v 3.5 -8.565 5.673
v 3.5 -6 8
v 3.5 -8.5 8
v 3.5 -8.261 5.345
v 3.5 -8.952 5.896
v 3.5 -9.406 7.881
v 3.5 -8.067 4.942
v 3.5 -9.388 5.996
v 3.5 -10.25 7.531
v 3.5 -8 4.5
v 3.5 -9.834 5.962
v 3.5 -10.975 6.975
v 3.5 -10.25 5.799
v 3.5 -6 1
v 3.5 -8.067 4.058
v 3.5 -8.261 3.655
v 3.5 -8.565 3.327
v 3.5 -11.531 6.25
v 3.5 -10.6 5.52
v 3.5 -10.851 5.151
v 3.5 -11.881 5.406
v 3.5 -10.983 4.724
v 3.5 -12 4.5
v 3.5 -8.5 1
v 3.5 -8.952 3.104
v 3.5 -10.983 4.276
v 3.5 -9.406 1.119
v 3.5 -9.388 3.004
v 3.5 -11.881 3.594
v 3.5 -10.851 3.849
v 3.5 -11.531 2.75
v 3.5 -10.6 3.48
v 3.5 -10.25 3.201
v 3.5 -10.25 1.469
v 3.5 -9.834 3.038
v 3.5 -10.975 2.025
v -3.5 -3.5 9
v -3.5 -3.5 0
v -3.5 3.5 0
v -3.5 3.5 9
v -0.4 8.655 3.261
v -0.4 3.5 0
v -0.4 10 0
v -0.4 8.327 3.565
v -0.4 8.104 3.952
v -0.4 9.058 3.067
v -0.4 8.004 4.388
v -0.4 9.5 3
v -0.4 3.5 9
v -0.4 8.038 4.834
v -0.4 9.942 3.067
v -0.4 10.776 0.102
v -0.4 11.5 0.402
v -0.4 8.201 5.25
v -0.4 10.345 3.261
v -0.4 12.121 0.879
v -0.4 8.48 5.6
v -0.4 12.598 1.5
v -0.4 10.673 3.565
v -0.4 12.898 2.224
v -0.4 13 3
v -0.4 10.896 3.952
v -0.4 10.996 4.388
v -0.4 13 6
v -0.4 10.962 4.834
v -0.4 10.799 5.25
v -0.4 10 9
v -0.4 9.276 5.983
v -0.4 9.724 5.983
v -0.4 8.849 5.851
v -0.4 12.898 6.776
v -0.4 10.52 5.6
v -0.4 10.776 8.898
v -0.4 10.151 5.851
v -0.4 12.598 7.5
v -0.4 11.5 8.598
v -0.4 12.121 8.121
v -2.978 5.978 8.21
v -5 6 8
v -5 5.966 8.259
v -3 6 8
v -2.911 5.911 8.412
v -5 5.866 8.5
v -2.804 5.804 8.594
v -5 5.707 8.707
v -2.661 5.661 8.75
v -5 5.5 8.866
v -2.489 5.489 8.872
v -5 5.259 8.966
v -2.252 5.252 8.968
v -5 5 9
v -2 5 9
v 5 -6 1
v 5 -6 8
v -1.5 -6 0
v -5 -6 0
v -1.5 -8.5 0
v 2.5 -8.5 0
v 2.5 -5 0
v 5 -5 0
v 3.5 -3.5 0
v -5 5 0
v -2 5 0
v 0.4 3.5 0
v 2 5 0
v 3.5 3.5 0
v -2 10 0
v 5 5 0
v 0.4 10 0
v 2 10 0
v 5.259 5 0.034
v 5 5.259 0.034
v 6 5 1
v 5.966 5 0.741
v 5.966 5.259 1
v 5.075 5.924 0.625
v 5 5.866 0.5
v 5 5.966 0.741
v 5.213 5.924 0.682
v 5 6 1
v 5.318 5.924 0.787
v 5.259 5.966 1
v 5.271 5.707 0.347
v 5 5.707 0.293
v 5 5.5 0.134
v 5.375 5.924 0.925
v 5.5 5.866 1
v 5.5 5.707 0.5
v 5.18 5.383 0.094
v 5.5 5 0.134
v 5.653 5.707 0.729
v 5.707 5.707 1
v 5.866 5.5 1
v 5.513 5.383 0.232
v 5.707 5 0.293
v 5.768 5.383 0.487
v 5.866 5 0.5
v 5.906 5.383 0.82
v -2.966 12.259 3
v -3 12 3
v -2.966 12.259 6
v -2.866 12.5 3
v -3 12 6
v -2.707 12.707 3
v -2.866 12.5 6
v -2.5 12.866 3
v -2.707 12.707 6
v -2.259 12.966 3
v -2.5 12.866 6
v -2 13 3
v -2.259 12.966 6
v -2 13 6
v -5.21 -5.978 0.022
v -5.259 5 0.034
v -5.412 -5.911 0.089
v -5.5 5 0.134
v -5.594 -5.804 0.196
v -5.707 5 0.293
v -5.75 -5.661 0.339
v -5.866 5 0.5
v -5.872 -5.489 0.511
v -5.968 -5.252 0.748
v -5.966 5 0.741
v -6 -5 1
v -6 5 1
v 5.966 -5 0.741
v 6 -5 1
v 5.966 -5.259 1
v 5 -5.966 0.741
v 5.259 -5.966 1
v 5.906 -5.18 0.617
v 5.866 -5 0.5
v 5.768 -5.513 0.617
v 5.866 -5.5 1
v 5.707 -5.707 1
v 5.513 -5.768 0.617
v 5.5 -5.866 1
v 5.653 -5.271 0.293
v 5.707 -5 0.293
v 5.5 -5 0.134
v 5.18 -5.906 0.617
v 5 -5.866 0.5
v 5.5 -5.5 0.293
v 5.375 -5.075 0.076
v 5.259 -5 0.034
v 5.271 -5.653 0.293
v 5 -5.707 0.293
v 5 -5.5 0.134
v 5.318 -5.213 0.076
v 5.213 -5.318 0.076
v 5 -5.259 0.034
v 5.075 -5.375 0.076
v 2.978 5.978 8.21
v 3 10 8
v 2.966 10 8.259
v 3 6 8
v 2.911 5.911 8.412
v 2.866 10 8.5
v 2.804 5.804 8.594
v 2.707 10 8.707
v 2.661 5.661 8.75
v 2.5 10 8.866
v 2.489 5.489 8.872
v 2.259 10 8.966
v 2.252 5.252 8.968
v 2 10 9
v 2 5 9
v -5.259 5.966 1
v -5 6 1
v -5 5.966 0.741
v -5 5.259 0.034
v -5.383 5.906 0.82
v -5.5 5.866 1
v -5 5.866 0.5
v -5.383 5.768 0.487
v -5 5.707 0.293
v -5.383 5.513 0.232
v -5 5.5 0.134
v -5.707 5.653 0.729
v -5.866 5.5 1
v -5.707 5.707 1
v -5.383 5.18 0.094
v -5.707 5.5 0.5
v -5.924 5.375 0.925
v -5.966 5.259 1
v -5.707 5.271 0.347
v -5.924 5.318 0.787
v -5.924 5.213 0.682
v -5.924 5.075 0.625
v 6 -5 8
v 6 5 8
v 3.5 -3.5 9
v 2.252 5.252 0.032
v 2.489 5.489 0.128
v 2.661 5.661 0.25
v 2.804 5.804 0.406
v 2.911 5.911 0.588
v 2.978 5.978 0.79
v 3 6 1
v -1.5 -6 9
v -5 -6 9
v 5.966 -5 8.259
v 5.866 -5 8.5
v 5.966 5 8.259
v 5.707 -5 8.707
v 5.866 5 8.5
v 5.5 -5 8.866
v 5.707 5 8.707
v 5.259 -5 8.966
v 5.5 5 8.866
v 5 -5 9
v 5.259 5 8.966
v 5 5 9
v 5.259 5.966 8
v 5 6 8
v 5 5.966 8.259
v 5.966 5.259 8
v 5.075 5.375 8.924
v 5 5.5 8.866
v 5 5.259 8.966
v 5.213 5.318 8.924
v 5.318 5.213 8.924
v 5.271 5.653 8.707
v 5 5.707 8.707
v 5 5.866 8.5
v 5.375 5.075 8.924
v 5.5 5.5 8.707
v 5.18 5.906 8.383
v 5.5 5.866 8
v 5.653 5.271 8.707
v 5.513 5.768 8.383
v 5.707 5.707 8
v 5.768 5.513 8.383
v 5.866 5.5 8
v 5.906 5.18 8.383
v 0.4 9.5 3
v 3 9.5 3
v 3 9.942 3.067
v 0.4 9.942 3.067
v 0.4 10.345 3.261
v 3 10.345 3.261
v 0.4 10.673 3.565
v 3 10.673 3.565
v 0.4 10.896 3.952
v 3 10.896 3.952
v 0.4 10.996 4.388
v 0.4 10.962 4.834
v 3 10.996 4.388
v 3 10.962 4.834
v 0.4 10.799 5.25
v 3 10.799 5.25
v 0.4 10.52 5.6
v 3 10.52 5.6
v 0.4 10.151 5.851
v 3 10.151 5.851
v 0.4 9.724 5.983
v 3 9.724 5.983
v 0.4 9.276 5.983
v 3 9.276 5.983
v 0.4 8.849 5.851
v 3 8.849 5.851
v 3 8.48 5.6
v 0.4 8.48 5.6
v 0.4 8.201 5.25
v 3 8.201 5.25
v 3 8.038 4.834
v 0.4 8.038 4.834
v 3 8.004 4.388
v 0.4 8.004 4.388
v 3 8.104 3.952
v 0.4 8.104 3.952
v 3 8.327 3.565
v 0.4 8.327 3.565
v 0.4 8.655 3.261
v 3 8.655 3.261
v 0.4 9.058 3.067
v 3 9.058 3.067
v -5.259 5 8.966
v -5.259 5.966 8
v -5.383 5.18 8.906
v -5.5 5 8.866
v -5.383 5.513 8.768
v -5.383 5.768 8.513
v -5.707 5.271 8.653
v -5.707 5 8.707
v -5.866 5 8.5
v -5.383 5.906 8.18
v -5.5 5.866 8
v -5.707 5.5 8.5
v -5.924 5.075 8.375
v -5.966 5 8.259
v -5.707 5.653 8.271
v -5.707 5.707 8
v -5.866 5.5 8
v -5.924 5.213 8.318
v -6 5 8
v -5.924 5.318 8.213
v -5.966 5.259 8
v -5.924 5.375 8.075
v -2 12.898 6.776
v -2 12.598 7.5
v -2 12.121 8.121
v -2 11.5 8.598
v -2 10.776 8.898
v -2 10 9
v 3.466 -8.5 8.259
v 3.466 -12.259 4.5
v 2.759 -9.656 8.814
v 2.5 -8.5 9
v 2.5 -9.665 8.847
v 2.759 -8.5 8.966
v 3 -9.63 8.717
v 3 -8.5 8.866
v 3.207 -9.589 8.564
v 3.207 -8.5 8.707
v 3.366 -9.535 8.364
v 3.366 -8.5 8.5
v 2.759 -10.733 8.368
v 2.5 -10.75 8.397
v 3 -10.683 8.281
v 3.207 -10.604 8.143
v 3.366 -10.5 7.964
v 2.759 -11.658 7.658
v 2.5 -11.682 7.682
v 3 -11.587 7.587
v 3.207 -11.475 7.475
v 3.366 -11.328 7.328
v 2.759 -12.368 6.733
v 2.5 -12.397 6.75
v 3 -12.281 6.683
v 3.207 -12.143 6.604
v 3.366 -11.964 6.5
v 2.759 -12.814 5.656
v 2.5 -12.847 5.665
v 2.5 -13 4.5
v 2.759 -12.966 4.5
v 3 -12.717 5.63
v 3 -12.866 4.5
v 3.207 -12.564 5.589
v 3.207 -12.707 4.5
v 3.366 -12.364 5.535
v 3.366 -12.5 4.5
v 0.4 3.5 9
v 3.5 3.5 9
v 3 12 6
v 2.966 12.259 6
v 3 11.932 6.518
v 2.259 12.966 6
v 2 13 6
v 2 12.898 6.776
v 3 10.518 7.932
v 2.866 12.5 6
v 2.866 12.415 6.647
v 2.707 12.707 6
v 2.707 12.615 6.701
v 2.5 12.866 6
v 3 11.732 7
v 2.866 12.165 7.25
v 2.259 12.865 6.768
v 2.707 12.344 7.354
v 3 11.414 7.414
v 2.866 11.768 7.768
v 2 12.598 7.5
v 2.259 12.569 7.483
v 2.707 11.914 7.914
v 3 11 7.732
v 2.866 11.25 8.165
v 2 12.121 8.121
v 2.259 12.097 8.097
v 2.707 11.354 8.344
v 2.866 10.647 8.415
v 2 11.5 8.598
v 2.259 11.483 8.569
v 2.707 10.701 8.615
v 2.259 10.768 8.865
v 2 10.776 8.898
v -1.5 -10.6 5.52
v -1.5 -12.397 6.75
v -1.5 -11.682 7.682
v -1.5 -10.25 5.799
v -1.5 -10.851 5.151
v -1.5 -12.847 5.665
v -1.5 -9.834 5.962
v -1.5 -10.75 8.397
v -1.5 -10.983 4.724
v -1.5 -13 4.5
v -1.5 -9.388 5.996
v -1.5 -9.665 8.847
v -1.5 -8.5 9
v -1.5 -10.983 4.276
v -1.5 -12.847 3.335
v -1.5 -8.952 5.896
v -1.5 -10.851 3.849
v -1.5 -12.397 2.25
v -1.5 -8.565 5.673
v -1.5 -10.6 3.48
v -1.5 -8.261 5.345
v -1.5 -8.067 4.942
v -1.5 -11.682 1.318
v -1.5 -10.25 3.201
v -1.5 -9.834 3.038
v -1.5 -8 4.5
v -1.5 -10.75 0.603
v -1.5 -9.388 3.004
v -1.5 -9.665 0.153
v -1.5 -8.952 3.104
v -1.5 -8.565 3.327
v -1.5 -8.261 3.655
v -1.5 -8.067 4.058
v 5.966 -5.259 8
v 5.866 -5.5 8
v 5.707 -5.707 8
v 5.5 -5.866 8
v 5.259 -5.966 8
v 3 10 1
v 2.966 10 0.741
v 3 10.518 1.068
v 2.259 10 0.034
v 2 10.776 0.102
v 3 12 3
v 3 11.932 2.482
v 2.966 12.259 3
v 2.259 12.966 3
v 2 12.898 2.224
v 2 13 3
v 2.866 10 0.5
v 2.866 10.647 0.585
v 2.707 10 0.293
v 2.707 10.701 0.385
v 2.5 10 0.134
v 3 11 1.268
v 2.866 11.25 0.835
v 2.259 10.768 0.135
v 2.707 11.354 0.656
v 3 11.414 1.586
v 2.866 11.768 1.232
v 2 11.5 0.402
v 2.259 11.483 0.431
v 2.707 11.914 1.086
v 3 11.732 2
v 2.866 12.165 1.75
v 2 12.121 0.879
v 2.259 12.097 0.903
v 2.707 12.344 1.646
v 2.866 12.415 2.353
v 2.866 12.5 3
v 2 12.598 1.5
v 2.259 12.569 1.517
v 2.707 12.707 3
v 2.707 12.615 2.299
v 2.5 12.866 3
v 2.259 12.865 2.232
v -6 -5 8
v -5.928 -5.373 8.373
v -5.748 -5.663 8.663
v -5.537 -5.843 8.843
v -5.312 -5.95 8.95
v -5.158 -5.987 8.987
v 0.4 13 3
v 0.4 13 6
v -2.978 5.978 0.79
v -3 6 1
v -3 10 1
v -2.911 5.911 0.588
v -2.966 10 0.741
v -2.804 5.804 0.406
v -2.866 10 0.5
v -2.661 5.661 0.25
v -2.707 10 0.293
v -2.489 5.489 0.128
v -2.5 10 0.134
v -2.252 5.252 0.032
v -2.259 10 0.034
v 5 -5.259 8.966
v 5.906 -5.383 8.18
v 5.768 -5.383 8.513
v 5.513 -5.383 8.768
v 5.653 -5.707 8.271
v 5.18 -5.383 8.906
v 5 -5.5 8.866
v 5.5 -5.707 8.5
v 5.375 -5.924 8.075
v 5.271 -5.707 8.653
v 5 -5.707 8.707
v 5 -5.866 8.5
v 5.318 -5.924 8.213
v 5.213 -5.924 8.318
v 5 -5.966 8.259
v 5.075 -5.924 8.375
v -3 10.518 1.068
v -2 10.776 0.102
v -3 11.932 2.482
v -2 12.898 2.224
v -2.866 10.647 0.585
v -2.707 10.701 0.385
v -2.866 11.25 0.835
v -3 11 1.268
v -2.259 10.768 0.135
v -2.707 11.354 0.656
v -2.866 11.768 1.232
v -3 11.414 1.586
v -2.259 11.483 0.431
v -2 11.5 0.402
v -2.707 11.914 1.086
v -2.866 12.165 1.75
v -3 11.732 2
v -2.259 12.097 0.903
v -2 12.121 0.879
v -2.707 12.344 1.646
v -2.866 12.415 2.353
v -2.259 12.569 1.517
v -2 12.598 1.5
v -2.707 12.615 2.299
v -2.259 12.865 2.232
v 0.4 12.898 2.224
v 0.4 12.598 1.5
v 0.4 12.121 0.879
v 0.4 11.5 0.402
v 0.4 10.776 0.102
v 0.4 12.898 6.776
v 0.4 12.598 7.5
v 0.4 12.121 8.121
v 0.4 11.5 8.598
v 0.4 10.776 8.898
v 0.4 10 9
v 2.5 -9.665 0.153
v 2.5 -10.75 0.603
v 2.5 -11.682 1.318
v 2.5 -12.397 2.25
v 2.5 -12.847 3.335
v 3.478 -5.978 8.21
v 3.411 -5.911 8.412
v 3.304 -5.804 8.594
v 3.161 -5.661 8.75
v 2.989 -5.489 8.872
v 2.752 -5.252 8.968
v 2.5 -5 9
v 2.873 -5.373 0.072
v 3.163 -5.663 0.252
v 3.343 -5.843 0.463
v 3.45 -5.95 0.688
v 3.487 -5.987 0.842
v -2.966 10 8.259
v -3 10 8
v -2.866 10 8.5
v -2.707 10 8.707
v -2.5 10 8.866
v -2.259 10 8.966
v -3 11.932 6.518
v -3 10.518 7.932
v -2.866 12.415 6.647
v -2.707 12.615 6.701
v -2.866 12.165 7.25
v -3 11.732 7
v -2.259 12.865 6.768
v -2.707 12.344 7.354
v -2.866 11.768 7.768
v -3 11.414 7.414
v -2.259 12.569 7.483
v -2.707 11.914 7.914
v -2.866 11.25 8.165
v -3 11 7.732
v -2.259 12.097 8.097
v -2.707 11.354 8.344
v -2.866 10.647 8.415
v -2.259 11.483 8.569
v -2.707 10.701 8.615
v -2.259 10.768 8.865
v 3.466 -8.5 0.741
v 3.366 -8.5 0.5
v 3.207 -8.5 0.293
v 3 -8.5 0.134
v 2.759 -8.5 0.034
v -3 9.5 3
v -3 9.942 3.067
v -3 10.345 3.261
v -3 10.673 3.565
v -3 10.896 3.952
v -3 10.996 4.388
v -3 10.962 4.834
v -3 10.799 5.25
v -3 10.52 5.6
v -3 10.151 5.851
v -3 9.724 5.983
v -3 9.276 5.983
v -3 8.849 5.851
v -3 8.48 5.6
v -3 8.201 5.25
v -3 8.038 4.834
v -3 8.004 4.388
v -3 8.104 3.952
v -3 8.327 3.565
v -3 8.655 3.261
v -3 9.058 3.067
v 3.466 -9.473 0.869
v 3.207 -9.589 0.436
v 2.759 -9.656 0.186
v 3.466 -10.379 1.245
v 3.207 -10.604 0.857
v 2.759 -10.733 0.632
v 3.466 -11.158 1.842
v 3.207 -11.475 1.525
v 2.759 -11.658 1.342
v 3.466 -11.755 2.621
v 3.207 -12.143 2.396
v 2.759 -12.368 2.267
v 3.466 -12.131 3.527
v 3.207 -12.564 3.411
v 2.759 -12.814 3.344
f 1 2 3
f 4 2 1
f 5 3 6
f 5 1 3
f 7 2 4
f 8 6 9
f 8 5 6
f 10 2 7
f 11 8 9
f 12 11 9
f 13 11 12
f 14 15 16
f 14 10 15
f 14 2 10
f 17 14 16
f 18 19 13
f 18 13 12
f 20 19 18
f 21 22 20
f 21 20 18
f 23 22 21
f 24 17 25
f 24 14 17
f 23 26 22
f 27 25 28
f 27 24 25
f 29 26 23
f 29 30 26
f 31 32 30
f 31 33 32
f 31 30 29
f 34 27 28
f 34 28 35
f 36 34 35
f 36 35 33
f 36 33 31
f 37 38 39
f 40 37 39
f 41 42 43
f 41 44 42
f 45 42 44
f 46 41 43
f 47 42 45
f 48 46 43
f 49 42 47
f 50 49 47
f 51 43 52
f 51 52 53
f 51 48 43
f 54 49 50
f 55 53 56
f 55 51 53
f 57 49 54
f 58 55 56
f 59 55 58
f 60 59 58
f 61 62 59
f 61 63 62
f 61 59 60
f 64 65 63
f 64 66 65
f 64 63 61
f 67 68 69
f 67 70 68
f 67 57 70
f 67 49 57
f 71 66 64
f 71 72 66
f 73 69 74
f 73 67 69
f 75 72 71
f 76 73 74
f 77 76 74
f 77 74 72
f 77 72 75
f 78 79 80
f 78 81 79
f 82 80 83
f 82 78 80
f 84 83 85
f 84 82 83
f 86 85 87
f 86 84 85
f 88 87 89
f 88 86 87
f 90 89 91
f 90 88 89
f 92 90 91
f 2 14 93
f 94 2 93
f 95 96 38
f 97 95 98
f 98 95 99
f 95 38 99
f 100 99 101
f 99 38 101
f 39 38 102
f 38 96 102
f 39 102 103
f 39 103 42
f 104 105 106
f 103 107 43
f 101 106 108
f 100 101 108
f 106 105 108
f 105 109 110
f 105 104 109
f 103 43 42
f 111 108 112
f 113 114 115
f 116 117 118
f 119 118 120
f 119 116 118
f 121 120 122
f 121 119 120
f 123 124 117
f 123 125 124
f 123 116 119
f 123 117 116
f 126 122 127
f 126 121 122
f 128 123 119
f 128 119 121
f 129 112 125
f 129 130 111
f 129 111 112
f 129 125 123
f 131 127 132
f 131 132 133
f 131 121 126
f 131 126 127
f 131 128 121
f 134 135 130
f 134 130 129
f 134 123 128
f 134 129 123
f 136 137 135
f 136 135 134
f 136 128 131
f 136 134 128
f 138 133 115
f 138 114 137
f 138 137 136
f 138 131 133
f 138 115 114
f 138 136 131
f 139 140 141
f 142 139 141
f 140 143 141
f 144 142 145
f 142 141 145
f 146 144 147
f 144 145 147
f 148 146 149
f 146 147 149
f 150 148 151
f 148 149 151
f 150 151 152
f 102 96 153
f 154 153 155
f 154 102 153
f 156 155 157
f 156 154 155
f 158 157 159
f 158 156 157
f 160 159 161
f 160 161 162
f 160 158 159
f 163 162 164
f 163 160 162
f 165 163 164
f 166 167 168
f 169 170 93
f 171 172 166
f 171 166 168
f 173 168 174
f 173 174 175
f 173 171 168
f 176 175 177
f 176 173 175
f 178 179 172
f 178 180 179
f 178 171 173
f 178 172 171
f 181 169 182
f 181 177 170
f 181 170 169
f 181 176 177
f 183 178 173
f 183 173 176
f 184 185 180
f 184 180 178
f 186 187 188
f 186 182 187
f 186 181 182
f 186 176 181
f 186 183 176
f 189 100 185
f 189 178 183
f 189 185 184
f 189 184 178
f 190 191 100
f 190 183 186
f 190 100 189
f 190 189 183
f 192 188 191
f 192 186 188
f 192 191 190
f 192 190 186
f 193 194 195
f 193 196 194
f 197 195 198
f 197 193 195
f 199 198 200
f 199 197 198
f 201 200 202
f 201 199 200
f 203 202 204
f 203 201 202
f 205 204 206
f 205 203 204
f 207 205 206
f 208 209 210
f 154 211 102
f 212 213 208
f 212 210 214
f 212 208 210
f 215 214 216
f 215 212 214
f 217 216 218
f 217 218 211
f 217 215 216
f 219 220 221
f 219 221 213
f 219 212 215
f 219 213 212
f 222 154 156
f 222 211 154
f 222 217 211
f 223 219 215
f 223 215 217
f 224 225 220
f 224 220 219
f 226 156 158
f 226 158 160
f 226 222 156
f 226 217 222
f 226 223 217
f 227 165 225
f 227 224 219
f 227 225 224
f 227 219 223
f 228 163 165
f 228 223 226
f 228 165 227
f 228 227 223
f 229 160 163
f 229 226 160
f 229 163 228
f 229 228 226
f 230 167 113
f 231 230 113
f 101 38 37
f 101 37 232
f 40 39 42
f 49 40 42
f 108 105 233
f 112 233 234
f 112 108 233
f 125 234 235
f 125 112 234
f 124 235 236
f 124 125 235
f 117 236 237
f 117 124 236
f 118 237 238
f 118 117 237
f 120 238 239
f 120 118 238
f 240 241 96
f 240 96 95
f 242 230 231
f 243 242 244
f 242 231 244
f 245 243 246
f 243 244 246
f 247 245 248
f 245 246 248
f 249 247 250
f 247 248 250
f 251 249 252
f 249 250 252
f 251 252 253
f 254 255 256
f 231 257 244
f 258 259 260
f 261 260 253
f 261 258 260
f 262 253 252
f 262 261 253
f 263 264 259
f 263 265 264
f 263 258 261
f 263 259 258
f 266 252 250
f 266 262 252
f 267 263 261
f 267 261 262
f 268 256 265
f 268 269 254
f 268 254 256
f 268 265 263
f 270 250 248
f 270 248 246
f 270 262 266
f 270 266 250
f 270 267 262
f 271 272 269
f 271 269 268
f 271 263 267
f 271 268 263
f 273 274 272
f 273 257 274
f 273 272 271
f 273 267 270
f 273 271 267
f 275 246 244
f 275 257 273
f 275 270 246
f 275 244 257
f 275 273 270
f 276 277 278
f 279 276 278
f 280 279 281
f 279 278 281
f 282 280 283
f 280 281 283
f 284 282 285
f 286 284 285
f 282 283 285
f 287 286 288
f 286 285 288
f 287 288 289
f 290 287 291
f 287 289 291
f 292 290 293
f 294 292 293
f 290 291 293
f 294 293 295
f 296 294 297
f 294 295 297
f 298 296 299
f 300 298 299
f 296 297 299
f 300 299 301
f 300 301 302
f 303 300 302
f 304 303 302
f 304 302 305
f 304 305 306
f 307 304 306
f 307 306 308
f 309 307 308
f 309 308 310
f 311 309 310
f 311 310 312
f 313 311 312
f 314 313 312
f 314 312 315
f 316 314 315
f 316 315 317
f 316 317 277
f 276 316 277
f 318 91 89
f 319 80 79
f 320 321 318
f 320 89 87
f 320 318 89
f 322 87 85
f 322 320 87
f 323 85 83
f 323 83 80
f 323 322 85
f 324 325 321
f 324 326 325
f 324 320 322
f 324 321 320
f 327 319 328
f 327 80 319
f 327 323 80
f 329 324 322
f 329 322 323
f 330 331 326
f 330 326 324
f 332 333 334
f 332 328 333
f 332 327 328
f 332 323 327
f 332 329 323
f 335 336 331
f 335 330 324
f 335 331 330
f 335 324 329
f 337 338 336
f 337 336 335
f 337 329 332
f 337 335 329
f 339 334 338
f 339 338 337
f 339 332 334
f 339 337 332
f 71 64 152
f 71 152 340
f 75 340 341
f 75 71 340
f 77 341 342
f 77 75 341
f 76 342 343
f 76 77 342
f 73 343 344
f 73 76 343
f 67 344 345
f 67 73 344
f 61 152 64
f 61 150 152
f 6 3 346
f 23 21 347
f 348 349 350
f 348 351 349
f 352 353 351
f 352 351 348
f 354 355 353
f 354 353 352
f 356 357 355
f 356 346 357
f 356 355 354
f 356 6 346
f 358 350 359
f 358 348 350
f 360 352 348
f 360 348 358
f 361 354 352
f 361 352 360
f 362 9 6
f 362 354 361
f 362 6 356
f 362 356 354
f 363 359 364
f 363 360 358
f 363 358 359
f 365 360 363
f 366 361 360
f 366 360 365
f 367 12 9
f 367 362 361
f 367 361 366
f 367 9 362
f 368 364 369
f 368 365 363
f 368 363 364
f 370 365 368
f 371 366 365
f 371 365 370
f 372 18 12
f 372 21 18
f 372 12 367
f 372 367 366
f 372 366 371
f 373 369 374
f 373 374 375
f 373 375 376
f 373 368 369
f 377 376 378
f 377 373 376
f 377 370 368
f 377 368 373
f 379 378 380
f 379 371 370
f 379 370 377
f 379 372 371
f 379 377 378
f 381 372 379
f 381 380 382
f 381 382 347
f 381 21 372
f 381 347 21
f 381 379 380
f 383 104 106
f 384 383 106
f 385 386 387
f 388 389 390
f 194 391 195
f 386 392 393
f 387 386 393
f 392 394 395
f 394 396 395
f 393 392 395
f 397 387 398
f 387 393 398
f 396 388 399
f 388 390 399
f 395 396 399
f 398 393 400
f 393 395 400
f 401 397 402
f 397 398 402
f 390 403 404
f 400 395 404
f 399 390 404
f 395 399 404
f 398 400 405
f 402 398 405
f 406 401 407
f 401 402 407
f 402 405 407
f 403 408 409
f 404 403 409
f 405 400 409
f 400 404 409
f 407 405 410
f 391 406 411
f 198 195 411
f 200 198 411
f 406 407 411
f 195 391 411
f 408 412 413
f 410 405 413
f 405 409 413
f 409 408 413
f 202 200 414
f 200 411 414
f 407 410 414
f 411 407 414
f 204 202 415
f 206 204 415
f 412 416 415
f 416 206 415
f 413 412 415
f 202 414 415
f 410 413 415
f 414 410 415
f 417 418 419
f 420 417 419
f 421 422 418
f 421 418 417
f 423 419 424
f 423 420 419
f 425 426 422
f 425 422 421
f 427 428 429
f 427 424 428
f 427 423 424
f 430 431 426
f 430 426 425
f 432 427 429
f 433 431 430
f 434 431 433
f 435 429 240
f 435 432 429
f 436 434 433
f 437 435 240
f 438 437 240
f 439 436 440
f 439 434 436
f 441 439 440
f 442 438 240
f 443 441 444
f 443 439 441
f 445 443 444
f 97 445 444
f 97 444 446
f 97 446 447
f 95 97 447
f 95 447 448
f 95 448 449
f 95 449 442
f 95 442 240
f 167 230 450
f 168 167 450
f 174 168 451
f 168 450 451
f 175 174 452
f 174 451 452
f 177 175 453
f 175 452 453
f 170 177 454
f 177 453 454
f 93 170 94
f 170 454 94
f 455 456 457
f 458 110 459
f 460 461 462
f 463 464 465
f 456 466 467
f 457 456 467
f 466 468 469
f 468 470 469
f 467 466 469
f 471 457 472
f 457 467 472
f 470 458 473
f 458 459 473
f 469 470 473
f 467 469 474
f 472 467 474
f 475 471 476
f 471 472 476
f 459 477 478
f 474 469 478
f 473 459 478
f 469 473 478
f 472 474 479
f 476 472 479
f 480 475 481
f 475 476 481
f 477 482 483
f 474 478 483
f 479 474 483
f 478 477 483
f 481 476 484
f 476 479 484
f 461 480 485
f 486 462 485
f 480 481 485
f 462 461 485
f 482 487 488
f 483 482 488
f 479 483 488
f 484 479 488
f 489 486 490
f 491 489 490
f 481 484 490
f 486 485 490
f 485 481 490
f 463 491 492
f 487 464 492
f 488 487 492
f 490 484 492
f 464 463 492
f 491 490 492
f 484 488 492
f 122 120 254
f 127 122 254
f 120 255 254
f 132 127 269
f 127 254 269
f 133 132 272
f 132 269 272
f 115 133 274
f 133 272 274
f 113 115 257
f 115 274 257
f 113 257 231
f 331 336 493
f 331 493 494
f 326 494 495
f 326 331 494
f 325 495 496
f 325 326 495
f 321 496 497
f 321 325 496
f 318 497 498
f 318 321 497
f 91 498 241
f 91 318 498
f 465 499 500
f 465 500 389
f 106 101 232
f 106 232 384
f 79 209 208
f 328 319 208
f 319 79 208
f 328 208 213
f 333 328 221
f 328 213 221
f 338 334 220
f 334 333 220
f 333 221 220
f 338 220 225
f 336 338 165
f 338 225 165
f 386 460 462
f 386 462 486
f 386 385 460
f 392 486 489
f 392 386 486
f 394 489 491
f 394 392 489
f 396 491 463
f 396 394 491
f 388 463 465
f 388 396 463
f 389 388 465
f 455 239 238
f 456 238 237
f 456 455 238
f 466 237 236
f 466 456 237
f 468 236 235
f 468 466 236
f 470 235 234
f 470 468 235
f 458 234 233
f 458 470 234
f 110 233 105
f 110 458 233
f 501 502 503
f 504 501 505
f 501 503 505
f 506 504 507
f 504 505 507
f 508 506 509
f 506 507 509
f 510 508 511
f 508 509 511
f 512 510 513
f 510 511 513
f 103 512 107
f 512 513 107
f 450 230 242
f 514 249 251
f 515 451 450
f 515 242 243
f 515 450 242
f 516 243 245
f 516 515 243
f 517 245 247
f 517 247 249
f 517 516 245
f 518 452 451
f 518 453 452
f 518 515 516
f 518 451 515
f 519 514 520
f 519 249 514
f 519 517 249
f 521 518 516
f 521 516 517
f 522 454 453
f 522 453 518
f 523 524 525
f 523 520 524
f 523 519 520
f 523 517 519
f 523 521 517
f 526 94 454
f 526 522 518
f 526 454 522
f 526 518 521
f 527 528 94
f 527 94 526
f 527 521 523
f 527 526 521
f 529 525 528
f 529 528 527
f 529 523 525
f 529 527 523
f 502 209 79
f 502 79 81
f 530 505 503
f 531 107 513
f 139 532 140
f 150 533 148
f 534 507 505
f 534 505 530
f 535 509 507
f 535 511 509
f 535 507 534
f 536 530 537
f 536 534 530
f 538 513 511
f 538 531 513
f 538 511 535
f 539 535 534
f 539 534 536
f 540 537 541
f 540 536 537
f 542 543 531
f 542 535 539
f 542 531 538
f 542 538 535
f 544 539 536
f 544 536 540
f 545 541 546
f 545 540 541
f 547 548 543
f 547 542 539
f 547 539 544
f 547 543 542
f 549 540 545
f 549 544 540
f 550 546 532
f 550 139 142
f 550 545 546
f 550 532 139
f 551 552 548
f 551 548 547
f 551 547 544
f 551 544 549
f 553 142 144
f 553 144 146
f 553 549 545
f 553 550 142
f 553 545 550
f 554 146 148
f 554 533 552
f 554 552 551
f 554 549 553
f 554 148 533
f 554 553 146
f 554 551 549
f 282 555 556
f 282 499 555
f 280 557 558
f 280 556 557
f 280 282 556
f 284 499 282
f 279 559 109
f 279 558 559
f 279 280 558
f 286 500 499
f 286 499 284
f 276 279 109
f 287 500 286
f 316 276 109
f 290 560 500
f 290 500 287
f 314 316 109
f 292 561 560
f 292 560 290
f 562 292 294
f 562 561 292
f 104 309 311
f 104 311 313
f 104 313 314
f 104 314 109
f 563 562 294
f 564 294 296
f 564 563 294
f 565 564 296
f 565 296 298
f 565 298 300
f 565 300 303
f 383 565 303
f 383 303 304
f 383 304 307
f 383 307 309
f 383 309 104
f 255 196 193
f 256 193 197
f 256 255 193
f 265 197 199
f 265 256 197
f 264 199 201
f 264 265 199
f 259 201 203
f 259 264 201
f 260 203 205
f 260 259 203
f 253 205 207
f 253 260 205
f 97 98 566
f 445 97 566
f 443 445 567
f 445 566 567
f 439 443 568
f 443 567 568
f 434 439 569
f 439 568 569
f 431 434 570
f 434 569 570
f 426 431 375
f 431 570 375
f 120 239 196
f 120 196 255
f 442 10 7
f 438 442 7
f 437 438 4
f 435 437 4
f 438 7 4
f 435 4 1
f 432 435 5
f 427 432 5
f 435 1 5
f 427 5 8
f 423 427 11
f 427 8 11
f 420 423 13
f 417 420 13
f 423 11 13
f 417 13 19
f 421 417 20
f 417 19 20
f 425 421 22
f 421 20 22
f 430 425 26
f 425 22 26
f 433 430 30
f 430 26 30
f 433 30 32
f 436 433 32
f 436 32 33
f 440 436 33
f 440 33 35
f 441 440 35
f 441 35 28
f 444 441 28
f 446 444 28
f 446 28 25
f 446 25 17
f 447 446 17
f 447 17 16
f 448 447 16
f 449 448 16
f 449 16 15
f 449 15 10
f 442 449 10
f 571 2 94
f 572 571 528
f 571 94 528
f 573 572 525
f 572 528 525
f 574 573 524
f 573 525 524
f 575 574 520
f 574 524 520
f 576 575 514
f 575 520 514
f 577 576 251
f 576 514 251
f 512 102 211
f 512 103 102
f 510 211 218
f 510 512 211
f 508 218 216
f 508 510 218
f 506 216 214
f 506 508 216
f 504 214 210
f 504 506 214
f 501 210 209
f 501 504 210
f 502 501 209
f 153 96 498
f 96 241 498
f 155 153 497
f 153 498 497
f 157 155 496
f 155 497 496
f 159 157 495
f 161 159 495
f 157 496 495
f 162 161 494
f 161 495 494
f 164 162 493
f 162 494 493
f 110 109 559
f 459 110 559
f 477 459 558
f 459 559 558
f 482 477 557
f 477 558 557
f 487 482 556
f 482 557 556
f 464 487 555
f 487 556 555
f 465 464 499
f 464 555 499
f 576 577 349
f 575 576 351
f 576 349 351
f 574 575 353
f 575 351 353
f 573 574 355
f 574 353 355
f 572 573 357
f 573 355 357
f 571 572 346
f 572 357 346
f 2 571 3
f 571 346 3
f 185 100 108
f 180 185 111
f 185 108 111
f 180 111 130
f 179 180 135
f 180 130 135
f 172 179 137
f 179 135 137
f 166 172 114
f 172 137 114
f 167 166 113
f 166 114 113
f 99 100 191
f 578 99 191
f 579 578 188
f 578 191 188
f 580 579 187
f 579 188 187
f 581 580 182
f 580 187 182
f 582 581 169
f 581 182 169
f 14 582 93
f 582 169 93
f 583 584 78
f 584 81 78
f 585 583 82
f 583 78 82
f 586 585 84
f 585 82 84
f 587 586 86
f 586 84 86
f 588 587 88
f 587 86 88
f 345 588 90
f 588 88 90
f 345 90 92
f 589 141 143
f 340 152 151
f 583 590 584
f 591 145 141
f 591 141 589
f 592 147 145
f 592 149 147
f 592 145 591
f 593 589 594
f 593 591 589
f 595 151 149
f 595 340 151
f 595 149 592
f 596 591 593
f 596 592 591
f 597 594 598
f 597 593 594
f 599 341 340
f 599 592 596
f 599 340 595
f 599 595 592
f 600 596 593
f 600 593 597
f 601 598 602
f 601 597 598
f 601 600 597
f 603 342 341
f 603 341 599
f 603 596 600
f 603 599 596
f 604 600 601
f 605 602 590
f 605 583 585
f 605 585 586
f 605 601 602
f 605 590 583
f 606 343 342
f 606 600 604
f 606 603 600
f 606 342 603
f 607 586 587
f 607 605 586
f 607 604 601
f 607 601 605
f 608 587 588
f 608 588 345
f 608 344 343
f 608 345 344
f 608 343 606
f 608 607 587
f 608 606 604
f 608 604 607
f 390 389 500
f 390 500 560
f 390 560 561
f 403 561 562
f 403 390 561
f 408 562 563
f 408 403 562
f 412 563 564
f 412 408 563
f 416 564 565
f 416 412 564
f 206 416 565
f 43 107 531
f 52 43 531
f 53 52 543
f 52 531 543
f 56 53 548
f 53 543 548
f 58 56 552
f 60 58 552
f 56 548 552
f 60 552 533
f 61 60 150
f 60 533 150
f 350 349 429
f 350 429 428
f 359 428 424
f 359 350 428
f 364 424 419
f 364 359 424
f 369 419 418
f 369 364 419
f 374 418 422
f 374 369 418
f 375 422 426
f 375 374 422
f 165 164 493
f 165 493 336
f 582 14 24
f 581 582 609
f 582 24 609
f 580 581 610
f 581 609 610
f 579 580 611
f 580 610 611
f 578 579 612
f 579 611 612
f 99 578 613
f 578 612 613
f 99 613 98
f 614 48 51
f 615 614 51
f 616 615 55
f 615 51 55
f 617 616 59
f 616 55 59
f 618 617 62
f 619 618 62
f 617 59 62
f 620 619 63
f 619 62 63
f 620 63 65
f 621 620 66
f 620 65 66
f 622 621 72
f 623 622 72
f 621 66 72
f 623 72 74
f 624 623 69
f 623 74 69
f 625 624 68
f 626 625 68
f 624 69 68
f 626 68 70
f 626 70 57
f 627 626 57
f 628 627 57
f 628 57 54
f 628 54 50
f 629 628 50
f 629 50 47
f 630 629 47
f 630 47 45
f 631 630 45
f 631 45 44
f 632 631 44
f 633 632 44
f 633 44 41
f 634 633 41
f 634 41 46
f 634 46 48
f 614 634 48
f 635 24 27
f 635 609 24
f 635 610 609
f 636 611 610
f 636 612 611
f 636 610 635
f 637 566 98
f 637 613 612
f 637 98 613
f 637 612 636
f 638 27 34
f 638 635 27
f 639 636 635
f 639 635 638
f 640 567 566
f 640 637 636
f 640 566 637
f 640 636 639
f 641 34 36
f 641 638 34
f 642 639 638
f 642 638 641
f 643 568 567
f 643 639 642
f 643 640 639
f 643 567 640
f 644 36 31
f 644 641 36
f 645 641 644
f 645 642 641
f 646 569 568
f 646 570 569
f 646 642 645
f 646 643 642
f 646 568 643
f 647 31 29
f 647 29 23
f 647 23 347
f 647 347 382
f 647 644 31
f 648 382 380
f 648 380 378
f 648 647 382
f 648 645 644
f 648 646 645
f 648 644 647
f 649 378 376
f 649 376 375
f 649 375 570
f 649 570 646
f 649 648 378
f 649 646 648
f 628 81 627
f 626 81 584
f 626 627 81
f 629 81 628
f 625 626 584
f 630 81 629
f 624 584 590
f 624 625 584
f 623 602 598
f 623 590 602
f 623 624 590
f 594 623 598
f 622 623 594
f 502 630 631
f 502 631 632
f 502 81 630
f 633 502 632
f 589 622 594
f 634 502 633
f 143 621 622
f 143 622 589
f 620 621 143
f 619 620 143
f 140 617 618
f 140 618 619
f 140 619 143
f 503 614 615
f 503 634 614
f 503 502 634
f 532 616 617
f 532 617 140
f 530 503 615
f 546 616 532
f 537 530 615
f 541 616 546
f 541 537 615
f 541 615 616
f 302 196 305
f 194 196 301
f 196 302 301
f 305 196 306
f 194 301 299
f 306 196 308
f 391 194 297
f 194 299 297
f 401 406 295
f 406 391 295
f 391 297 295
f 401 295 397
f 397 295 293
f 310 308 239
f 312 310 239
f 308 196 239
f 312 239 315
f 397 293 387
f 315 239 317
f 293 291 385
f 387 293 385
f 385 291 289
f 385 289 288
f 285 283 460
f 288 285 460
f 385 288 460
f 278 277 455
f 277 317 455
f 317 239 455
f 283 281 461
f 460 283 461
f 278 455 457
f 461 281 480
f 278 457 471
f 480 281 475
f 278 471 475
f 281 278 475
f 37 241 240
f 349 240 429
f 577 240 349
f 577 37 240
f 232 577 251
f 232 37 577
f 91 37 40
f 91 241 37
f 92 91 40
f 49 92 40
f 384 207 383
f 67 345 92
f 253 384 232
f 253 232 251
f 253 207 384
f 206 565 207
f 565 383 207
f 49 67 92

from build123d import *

# Parameters (mm, degrees)
SKETCH_1_W          = 3
SKETCH_1_H          = 7
SKETCH_1_W_2        = 12
SKETCH_1_H_2        = 12
SKETCH_1_W_3        = 7
SKETCH_1_W_4        = 5
EXTRUDE_1_DEPTH     = 9
CUT_EXTRUDE_1_DEPTH = 17.911534525
FILLET_1_R          = 4.5
SKETCH_3_R          = 1.5
CUT_EXTRUDE_2_DEPTH = 19.445866746
FILLET_2_R          = 3
SKETCH_4_R          = 1.5
CUT_EXTRUDE_3_DEPTH = 19.193405399
FILLET_3_R          = 1
FILLET_4_R          = 1
FILLET_5_R          = 1
FILLET_6_R          = 1


# Some blends are built 0.0001 mm under size
with BuildPart() as part:
    # 草图1 → 凸台-拉伸1 (new body)
    # profile 1 of 4: a face of its own
    with BuildSketch(Plane.XY):
        with Locations((-1.5, 9.5)):
            Rectangle(SKETCH_1_W, SKETCH_1_H)
    # profile 2 of 4: a face of its own
    with BuildSketch(Plane.XY):
        with Locations((1.5, 9.5)):
            Rectangle(SKETCH_1_W, SKETCH_1_H)
    # profile 3 of 4: a face of its own
    with BuildSketch(Plane.XY):
        Rectangle(SKETCH_1_W_2, SKETCH_1_H_2)
        Rectangle(SKETCH_1_W_3, SKETCH_1_H, mode=Mode.SUBTRACT)
    # profile 4 of 4: a face of its own
    with BuildSketch(Plane.XY):
        with Locations((1, -9.5)):
            Rectangle(SKETCH_1_W_4, SKETCH_1_H)
    extrude(amount=EXTRUDE_1_DEPTH)

    # 草图2 → 切除-拉伸1 (cut, through all)
    with BuildSketch(Plane.XY.offset(9)):
        Polygon((0, 13), (0.4, 13), (0.4, 3.5), (0, 3.5), (-0.4, 3.5), (-0.4, 13), align=None)
    extrude(amount=-CUT_EXTRUDE_1_DEPTH, mode=Mode.SUBTRACT)

    # 圆角1
    fillet_1_edges = [part.edges().sort_by_distance(p)[0] for p in [
        (1, -13, 0),
        (1, -13, 9),
    ]]
    fillet(fillet_1_edges, radius=FILLET_1_R - 0.0001)  # a hair under: the kernel refuses the full size

    # 草图3 → 切除-拉伸2 (cut, through all)
    with BuildSketch(Plane(origin=(3.5, 0, 0), x_dir=(0, 0, -1), z_dir=(1, 0, 0))):
        with Locations(Location((-4.5, -9.5, 0), (0, 0, 90))):
            Circle(SKETCH_3_R)
    extrude(amount=-CUT_EXTRUDE_2_DEPTH, mode=Mode.SUBTRACT)

    # 圆角2
    fillet_2_edges = [part.edges().sort_by_distance(p)[0] for p in [
        (1.7, 13, 9),
        (1.7, 13, 0),
        (-1.7, 13, 0),
        (-1.7, 13, 9),
    ]]
    fillet(fillet_2_edges, radius=FILLET_2_R)

    # 草图4 → 切除-拉伸3 (cut, through all)
    with BuildSketch(Plane(origin=(3, 0, 0), x_dir=(0, 0, -1), z_dir=(1, 0, 0))):
        with Locations((-4.5, 9.5)):
            Circle(SKETCH_4_R)
    extrude(amount=-CUT_EXTRUDE_3_DEPTH, mode=Mode.SUBTRACT)

    # 圆角3
    fillet_3_edges = [part.edges().sort_by_distance(p)[0] for p in [
        (3, 12.121320344, 8.121320344),
        (3, 12.121320344, 0.878679656),
        (3, 8, 9),
        (6, 0, 0),
        (3, 8, 0),
        (4.5, 6, 0),
        (6, 6, 4.5),
        (6, -6, 4.5),
        (4.5, 6, 9),
        (6, 0, 9),
        (3, 13, 4.5),
    ]]
    fillet(fillet_3_edges, radius=FILLET_3_R)

    # 圆角4
    fillet_4_edges = [part.edges().sort_by_distance(p)[0] for p in [
        (-3, 13, 4.5),
        (-3, 12.121320344, 8.121320344),
        (-3, 12.121320344, 0.878679656),
        (-3, 8, 9),
        (-6, 0, 0),
        (-4.5, 6, 0),
        (-3, 8, 0),
        (-4.5, 6, 9),
        (-6, 0, 9),
        (-6, -6, 4.5),
    ]]
    fillet(fillet_4_edges, radius=FILLET_4_R)

    # 圆角5
    # the kernel refuses this fillet: 1 mm, written as the material it takes off along each edge
    with BuildSketch(Plane(origin=(-5, 5, 8), x_dir=(0, 1, 0), z_dir=(-1, 0, 0))) as fillet_5_piece_1_section:
        Polygon((0, 0), (FILLET_5_R, 0), (FILLET_5_R, -FILLET_5_R), (0, -FILLET_5_R), align=None)
    fillet_5_piece_1 = extrude(amount=FILLET_5_R, mode=Mode.PRIVATE)
    fillet_5_piece_1 = fillet_5_piece_1 - Plane(origin=(-5, 5, 8), x_dir=(0, -0.7071067811865475, -0.7071067811865475), z_dir=(-1, 0, 0)) * Sphere(FILLET_5_R, mode=Mode.PRIVATE)
    add(fillet_5_piece_1, mode=Mode.SUBTRACT)
    with BuildSketch(Plane(origin=(-5, 5, 1), x_dir=(0, 1, 0), z_dir=(-1, 0, 0))) as fillet_5_piece_2_section:
        Polygon((0, 0), (FILLET_5_R, 0), (FILLET_5_R, FILLET_5_R), (0, FILLET_5_R), align=None)
    fillet_5_piece_2 = extrude(amount=FILLET_5_R, mode=Mode.PRIVATE)
    fillet_5_piece_2 = fillet_5_piece_2 - Plane(origin=(-5, 5, 1), x_dir=(0, -0.7071067811865475, 0.7071067811865475), z_dir=(-1, 0, 0)) * Sphere(FILLET_5_R, mode=Mode.PRIVATE)
    add(fillet_5_piece_2, mode=Mode.SUBTRACT)
    with BuildSketch(Plane(origin=(-6, 6, 1), x_dir=(0, -1, 0), z_dir=(0, 0, 1))) as fillet_5_piece_3:
        with BuildLine():
            CenterArc((FILLET_5_R, FILLET_5_R), FILLET_5_R, 180, 90)
            Line((0, FILLET_5_R), (0, 0))
            Line((0, 0), (FILLET_5_R, 0))
        make_face()
    extrude(amount=7, mode=Mode.SUBTRACT)

    # 圆角6
    # the kernel refuses this fillet: 1 mm, written as the material it takes off along each edge
    with BuildSketch(Plane(origin=(5, -5, 8), x_dir=(0, 0, 1), z_dir=(0, -1, 0))) as fillet_6_piece_1_section:
        Polygon((0, 0), (FILLET_6_R, 0), (FILLET_6_R, -FILLET_6_R), (0, -FILLET_6_R), align=None)
    fillet_6_piece_1 = extrude(amount=FILLET_6_R, mode=Mode.PRIVATE)
    fillet_6_piece_1 = fillet_6_piece_1 - Plane(origin=(5, -5, 8), x_dir=(-0.7071067811865475, 0, -0.7071067811865475), z_dir=(0, -1, 0)) * Sphere(FILLET_6_R, mode=Mode.PRIVATE)
    add(fillet_6_piece_1, mode=Mode.SUBTRACT)
    with BuildSketch(Plane(origin=(5, -5, 1), x_dir=(0, -1, 0), z_dir=(0, 0, -1))) as fillet_6_piece_2_section:
        Polygon((0, 0), (FILLET_6_R, 0), (FILLET_6_R, -FILLET_6_R), (0, -FILLET_6_R), align=None)
    fillet_6_piece_2 = extrude(amount=FILLET_6_R, mode=Mode.PRIVATE)
    fillet_6_piece_2 = fillet_6_piece_2 - Plane(origin=(5, -5, 1), x_dir=(-0.7071067811865476, 0.7071067811865475, 0), z_dir=(0, 0, -1)) * Sphere(FILLET_6_R, mode=Mode.PRIVATE)
    add(fillet_6_piece_2, mode=Mode.SUBTRACT)
    with BuildSketch(Plane(origin=(5, -6, 0), x_dir=(0, 1, 0), z_dir=(-1, 0, 0)), Plane(origin=(5, -6, 9), x_dir=(0, 0, -1), z_dir=(-1, 0, 0))) as fillet_6_piece_3:
        with BuildLine():
            CenterArc((FILLET_6_R, -FILLET_6_R), FILLET_6_R, 90, 90)
            Line((0, -FILLET_6_R), (0, 0))
            Line((0, 0), (FILLET_6_R, 0))
        make_face()
    extrude(amount=1.5, mode=Mode.SUBTRACT)
    with BuildSketch(Plane(origin=(3.5, -8.5001, 0), x_dir=(-1, 0, 0), z_dir=(0, 1, 0)), Plane(origin=(3.5, -8.5001, 9), x_dir=(0, 0, -1), z_dir=(0, 1, 0))) as fillet_6_piece_4:
        with BuildLine():
            CenterArc((FILLET_6_R, FILLET_6_R), FILLET_6_R, 180, 90)
            Line((0, FILLET_6_R), (0, 0))
            Line((0, 0), (FILLET_6_R, 0))
        make_face()
    extrude(amount=2.5001, mode=Mode.SUBTRACT)
    with BuildSketch(Plane(origin=(3.5, -8.5001, 4.5001), x_dir=(0, 0, 1), z_dir=(0, 1, 0))) as fillet_6_piece_5:
        with BuildLine():
            CenterArc((4.4999 - FILLET_6_R, -FILLET_6_R), FILLET_6_R, 0, 90)
            Line((4.4999, -FILLET_6_R), (4.4999, 0))
            Line((4.4999, 0), (4.4999 - FILLET_6_R, 0))
        make_face()
    revolve(axis=Axis((3.5, -8.5001, 4.5001), (1, 0, 0)), revolution_arc=90, mode=Mode.SUBTRACT)
    with BuildSketch(Plane(origin=(3.5, -8.5001, 4.4999), x_dir=(0, 0, -1), z_dir=(0, 1, 0))) as fillet_6_piece_6:
        with BuildLine():
            CenterArc((4.4999 - FILLET_6_R, FILLET_6_R), FILLET_6_R, 270, 90)
            Line((4.4999 - FILLET_6_R, 0), (4.4999, 0))
            Line((4.4999, 0), (4.4999, FILLET_6_R))
        make_face()
    revolve(axis=Axis((3.5, -8.5001, 4.4999), (-1, 0, 0)), revolution_arc=90, mode=Mode.SUBTRACT)
    with BuildSketch(Plane(origin=(3.5, -13, 4.4999), x_dir=(0, 1, 0), z_dir=(0, 0, 1))) as fillet_6_piece_7:
        with BuildLine():
            CenterArc((FILLET_6_R, FILLET_6_R), FILLET_6_R, 180, 90)
            Line((0, FILLET_6_R), (0, 0))
            Line((0, 0), (FILLET_6_R, 0))
        make_face()
    extrude(amount=0.0002, mode=Mode.SUBTRACT)
    with BuildSketch(Plane(origin=(3.5, -8.5001, 0), x_dir=(-1, 0, 0), z_dir=(0, 1, 0))) as fillet_6_piece_8a_section:
        with BuildLine():
            CenterArc((FILLET_6_R, FILLET_6_R), FILLET_6_R, 180, 90)
            Line((0, FILLET_6_R), (0, 0))
            Line((0, 0), (FILLET_6_R, 0))
        make_face()
    fillet_6_piece_8a = extrude(amount=5.0001, mode=Mode.PRIVATE)
    fillet_6_piece_8a = split(fillet_6_piece_8a, bisect_by=Plane(origin=(3.273604886, -6, 0.226395114), z_dir=(0, 1, 0)), keep=Keep.TOP, mode=Mode.PRIVATE)
    with BuildSketch(Plane(origin=(5, -6, 0), x_dir=(0, 1, 0), z_dir=(-1, 0, 0))) as fillet_6_piece_8b_section:
        with BuildLine():
            CenterArc((FILLET_6_R, -FILLET_6_R), FILLET_6_R, 90, 90)
            Line((0, -FILLET_6_R), (0, 0))
            Line((0, 0), (FILLET_6_R, 0))
        make_face()
    fillet_6_piece_8b = extrude(amount=4, mode=Mode.PRIVATE)
    fillet_6_piece_8b = split(fillet_6_piece_8b, bisect_by=Plane(origin=(3.5, -5.773604886, 0.226395114), z_dir=(-1, 0, 0)), keep=Keep.TOP, mode=Mode.PRIVATE)
    fillet_6_piece_8 = fillet_6_piece_8a & fillet_6_piece_8b
    add(fillet_6_piece_8, mode=Mode.SUBTRACT)
    with BuildSketch(Plane(origin=(3.5, -8.5001, 9), x_dir=(0, 0, -1), z_dir=(0, 1, 0))) as fillet_6_piece_9a_section:
        with BuildLine():
            CenterArc((FILLET_6_R, FILLET_6_R), FILLET_6_R, 180, 90)
            Line((0, FILLET_6_R), (0, 0))
            Line((0, 0), (FILLET_6_R, 0))
        make_face()
    fillet_6_piece_9a = extrude(amount=5.0001, mode=Mode.PRIVATE)
    fillet_6_piece_9a = split(fillet_6_piece_9a, bisect_by=Plane(origin=(3.273604886, -6, 8.773604886), z_dir=(0, 1, 0)), keep=Keep.TOP, mode=Mode.PRIVATE)
    with BuildSketch(Plane(origin=(5, -6, 9), x_dir=(0, 0, -1), z_dir=(-1, 0, 0))) as fillet_6_piece_9b_section:
        with BuildLine():
            CenterArc((FILLET_6_R, -FILLET_6_R), FILLET_6_R, 90, 90)
            Line((0, -FILLET_6_R), (0, 0))
            Line((0, 0), (FILLET_6_R, 0))
        make_face()
    fillet_6_piece_9b = extrude(amount=4, mode=Mode.PRIVATE)
    fillet_6_piece_9b = split(fillet_6_piece_9b, bisect_by=Plane(origin=(3.5, -5.773604886, 8.773604886), z_dir=(-1, 0, 0)), keep=Keep.TOP, mode=Mode.PRIVATE)
    fillet_6_piece_9 = fillet_6_piece_9a & fillet_6_piece_9b
    add(fillet_6_piece_9, mode=Mode.SUBTRACT)


solid = part.part
